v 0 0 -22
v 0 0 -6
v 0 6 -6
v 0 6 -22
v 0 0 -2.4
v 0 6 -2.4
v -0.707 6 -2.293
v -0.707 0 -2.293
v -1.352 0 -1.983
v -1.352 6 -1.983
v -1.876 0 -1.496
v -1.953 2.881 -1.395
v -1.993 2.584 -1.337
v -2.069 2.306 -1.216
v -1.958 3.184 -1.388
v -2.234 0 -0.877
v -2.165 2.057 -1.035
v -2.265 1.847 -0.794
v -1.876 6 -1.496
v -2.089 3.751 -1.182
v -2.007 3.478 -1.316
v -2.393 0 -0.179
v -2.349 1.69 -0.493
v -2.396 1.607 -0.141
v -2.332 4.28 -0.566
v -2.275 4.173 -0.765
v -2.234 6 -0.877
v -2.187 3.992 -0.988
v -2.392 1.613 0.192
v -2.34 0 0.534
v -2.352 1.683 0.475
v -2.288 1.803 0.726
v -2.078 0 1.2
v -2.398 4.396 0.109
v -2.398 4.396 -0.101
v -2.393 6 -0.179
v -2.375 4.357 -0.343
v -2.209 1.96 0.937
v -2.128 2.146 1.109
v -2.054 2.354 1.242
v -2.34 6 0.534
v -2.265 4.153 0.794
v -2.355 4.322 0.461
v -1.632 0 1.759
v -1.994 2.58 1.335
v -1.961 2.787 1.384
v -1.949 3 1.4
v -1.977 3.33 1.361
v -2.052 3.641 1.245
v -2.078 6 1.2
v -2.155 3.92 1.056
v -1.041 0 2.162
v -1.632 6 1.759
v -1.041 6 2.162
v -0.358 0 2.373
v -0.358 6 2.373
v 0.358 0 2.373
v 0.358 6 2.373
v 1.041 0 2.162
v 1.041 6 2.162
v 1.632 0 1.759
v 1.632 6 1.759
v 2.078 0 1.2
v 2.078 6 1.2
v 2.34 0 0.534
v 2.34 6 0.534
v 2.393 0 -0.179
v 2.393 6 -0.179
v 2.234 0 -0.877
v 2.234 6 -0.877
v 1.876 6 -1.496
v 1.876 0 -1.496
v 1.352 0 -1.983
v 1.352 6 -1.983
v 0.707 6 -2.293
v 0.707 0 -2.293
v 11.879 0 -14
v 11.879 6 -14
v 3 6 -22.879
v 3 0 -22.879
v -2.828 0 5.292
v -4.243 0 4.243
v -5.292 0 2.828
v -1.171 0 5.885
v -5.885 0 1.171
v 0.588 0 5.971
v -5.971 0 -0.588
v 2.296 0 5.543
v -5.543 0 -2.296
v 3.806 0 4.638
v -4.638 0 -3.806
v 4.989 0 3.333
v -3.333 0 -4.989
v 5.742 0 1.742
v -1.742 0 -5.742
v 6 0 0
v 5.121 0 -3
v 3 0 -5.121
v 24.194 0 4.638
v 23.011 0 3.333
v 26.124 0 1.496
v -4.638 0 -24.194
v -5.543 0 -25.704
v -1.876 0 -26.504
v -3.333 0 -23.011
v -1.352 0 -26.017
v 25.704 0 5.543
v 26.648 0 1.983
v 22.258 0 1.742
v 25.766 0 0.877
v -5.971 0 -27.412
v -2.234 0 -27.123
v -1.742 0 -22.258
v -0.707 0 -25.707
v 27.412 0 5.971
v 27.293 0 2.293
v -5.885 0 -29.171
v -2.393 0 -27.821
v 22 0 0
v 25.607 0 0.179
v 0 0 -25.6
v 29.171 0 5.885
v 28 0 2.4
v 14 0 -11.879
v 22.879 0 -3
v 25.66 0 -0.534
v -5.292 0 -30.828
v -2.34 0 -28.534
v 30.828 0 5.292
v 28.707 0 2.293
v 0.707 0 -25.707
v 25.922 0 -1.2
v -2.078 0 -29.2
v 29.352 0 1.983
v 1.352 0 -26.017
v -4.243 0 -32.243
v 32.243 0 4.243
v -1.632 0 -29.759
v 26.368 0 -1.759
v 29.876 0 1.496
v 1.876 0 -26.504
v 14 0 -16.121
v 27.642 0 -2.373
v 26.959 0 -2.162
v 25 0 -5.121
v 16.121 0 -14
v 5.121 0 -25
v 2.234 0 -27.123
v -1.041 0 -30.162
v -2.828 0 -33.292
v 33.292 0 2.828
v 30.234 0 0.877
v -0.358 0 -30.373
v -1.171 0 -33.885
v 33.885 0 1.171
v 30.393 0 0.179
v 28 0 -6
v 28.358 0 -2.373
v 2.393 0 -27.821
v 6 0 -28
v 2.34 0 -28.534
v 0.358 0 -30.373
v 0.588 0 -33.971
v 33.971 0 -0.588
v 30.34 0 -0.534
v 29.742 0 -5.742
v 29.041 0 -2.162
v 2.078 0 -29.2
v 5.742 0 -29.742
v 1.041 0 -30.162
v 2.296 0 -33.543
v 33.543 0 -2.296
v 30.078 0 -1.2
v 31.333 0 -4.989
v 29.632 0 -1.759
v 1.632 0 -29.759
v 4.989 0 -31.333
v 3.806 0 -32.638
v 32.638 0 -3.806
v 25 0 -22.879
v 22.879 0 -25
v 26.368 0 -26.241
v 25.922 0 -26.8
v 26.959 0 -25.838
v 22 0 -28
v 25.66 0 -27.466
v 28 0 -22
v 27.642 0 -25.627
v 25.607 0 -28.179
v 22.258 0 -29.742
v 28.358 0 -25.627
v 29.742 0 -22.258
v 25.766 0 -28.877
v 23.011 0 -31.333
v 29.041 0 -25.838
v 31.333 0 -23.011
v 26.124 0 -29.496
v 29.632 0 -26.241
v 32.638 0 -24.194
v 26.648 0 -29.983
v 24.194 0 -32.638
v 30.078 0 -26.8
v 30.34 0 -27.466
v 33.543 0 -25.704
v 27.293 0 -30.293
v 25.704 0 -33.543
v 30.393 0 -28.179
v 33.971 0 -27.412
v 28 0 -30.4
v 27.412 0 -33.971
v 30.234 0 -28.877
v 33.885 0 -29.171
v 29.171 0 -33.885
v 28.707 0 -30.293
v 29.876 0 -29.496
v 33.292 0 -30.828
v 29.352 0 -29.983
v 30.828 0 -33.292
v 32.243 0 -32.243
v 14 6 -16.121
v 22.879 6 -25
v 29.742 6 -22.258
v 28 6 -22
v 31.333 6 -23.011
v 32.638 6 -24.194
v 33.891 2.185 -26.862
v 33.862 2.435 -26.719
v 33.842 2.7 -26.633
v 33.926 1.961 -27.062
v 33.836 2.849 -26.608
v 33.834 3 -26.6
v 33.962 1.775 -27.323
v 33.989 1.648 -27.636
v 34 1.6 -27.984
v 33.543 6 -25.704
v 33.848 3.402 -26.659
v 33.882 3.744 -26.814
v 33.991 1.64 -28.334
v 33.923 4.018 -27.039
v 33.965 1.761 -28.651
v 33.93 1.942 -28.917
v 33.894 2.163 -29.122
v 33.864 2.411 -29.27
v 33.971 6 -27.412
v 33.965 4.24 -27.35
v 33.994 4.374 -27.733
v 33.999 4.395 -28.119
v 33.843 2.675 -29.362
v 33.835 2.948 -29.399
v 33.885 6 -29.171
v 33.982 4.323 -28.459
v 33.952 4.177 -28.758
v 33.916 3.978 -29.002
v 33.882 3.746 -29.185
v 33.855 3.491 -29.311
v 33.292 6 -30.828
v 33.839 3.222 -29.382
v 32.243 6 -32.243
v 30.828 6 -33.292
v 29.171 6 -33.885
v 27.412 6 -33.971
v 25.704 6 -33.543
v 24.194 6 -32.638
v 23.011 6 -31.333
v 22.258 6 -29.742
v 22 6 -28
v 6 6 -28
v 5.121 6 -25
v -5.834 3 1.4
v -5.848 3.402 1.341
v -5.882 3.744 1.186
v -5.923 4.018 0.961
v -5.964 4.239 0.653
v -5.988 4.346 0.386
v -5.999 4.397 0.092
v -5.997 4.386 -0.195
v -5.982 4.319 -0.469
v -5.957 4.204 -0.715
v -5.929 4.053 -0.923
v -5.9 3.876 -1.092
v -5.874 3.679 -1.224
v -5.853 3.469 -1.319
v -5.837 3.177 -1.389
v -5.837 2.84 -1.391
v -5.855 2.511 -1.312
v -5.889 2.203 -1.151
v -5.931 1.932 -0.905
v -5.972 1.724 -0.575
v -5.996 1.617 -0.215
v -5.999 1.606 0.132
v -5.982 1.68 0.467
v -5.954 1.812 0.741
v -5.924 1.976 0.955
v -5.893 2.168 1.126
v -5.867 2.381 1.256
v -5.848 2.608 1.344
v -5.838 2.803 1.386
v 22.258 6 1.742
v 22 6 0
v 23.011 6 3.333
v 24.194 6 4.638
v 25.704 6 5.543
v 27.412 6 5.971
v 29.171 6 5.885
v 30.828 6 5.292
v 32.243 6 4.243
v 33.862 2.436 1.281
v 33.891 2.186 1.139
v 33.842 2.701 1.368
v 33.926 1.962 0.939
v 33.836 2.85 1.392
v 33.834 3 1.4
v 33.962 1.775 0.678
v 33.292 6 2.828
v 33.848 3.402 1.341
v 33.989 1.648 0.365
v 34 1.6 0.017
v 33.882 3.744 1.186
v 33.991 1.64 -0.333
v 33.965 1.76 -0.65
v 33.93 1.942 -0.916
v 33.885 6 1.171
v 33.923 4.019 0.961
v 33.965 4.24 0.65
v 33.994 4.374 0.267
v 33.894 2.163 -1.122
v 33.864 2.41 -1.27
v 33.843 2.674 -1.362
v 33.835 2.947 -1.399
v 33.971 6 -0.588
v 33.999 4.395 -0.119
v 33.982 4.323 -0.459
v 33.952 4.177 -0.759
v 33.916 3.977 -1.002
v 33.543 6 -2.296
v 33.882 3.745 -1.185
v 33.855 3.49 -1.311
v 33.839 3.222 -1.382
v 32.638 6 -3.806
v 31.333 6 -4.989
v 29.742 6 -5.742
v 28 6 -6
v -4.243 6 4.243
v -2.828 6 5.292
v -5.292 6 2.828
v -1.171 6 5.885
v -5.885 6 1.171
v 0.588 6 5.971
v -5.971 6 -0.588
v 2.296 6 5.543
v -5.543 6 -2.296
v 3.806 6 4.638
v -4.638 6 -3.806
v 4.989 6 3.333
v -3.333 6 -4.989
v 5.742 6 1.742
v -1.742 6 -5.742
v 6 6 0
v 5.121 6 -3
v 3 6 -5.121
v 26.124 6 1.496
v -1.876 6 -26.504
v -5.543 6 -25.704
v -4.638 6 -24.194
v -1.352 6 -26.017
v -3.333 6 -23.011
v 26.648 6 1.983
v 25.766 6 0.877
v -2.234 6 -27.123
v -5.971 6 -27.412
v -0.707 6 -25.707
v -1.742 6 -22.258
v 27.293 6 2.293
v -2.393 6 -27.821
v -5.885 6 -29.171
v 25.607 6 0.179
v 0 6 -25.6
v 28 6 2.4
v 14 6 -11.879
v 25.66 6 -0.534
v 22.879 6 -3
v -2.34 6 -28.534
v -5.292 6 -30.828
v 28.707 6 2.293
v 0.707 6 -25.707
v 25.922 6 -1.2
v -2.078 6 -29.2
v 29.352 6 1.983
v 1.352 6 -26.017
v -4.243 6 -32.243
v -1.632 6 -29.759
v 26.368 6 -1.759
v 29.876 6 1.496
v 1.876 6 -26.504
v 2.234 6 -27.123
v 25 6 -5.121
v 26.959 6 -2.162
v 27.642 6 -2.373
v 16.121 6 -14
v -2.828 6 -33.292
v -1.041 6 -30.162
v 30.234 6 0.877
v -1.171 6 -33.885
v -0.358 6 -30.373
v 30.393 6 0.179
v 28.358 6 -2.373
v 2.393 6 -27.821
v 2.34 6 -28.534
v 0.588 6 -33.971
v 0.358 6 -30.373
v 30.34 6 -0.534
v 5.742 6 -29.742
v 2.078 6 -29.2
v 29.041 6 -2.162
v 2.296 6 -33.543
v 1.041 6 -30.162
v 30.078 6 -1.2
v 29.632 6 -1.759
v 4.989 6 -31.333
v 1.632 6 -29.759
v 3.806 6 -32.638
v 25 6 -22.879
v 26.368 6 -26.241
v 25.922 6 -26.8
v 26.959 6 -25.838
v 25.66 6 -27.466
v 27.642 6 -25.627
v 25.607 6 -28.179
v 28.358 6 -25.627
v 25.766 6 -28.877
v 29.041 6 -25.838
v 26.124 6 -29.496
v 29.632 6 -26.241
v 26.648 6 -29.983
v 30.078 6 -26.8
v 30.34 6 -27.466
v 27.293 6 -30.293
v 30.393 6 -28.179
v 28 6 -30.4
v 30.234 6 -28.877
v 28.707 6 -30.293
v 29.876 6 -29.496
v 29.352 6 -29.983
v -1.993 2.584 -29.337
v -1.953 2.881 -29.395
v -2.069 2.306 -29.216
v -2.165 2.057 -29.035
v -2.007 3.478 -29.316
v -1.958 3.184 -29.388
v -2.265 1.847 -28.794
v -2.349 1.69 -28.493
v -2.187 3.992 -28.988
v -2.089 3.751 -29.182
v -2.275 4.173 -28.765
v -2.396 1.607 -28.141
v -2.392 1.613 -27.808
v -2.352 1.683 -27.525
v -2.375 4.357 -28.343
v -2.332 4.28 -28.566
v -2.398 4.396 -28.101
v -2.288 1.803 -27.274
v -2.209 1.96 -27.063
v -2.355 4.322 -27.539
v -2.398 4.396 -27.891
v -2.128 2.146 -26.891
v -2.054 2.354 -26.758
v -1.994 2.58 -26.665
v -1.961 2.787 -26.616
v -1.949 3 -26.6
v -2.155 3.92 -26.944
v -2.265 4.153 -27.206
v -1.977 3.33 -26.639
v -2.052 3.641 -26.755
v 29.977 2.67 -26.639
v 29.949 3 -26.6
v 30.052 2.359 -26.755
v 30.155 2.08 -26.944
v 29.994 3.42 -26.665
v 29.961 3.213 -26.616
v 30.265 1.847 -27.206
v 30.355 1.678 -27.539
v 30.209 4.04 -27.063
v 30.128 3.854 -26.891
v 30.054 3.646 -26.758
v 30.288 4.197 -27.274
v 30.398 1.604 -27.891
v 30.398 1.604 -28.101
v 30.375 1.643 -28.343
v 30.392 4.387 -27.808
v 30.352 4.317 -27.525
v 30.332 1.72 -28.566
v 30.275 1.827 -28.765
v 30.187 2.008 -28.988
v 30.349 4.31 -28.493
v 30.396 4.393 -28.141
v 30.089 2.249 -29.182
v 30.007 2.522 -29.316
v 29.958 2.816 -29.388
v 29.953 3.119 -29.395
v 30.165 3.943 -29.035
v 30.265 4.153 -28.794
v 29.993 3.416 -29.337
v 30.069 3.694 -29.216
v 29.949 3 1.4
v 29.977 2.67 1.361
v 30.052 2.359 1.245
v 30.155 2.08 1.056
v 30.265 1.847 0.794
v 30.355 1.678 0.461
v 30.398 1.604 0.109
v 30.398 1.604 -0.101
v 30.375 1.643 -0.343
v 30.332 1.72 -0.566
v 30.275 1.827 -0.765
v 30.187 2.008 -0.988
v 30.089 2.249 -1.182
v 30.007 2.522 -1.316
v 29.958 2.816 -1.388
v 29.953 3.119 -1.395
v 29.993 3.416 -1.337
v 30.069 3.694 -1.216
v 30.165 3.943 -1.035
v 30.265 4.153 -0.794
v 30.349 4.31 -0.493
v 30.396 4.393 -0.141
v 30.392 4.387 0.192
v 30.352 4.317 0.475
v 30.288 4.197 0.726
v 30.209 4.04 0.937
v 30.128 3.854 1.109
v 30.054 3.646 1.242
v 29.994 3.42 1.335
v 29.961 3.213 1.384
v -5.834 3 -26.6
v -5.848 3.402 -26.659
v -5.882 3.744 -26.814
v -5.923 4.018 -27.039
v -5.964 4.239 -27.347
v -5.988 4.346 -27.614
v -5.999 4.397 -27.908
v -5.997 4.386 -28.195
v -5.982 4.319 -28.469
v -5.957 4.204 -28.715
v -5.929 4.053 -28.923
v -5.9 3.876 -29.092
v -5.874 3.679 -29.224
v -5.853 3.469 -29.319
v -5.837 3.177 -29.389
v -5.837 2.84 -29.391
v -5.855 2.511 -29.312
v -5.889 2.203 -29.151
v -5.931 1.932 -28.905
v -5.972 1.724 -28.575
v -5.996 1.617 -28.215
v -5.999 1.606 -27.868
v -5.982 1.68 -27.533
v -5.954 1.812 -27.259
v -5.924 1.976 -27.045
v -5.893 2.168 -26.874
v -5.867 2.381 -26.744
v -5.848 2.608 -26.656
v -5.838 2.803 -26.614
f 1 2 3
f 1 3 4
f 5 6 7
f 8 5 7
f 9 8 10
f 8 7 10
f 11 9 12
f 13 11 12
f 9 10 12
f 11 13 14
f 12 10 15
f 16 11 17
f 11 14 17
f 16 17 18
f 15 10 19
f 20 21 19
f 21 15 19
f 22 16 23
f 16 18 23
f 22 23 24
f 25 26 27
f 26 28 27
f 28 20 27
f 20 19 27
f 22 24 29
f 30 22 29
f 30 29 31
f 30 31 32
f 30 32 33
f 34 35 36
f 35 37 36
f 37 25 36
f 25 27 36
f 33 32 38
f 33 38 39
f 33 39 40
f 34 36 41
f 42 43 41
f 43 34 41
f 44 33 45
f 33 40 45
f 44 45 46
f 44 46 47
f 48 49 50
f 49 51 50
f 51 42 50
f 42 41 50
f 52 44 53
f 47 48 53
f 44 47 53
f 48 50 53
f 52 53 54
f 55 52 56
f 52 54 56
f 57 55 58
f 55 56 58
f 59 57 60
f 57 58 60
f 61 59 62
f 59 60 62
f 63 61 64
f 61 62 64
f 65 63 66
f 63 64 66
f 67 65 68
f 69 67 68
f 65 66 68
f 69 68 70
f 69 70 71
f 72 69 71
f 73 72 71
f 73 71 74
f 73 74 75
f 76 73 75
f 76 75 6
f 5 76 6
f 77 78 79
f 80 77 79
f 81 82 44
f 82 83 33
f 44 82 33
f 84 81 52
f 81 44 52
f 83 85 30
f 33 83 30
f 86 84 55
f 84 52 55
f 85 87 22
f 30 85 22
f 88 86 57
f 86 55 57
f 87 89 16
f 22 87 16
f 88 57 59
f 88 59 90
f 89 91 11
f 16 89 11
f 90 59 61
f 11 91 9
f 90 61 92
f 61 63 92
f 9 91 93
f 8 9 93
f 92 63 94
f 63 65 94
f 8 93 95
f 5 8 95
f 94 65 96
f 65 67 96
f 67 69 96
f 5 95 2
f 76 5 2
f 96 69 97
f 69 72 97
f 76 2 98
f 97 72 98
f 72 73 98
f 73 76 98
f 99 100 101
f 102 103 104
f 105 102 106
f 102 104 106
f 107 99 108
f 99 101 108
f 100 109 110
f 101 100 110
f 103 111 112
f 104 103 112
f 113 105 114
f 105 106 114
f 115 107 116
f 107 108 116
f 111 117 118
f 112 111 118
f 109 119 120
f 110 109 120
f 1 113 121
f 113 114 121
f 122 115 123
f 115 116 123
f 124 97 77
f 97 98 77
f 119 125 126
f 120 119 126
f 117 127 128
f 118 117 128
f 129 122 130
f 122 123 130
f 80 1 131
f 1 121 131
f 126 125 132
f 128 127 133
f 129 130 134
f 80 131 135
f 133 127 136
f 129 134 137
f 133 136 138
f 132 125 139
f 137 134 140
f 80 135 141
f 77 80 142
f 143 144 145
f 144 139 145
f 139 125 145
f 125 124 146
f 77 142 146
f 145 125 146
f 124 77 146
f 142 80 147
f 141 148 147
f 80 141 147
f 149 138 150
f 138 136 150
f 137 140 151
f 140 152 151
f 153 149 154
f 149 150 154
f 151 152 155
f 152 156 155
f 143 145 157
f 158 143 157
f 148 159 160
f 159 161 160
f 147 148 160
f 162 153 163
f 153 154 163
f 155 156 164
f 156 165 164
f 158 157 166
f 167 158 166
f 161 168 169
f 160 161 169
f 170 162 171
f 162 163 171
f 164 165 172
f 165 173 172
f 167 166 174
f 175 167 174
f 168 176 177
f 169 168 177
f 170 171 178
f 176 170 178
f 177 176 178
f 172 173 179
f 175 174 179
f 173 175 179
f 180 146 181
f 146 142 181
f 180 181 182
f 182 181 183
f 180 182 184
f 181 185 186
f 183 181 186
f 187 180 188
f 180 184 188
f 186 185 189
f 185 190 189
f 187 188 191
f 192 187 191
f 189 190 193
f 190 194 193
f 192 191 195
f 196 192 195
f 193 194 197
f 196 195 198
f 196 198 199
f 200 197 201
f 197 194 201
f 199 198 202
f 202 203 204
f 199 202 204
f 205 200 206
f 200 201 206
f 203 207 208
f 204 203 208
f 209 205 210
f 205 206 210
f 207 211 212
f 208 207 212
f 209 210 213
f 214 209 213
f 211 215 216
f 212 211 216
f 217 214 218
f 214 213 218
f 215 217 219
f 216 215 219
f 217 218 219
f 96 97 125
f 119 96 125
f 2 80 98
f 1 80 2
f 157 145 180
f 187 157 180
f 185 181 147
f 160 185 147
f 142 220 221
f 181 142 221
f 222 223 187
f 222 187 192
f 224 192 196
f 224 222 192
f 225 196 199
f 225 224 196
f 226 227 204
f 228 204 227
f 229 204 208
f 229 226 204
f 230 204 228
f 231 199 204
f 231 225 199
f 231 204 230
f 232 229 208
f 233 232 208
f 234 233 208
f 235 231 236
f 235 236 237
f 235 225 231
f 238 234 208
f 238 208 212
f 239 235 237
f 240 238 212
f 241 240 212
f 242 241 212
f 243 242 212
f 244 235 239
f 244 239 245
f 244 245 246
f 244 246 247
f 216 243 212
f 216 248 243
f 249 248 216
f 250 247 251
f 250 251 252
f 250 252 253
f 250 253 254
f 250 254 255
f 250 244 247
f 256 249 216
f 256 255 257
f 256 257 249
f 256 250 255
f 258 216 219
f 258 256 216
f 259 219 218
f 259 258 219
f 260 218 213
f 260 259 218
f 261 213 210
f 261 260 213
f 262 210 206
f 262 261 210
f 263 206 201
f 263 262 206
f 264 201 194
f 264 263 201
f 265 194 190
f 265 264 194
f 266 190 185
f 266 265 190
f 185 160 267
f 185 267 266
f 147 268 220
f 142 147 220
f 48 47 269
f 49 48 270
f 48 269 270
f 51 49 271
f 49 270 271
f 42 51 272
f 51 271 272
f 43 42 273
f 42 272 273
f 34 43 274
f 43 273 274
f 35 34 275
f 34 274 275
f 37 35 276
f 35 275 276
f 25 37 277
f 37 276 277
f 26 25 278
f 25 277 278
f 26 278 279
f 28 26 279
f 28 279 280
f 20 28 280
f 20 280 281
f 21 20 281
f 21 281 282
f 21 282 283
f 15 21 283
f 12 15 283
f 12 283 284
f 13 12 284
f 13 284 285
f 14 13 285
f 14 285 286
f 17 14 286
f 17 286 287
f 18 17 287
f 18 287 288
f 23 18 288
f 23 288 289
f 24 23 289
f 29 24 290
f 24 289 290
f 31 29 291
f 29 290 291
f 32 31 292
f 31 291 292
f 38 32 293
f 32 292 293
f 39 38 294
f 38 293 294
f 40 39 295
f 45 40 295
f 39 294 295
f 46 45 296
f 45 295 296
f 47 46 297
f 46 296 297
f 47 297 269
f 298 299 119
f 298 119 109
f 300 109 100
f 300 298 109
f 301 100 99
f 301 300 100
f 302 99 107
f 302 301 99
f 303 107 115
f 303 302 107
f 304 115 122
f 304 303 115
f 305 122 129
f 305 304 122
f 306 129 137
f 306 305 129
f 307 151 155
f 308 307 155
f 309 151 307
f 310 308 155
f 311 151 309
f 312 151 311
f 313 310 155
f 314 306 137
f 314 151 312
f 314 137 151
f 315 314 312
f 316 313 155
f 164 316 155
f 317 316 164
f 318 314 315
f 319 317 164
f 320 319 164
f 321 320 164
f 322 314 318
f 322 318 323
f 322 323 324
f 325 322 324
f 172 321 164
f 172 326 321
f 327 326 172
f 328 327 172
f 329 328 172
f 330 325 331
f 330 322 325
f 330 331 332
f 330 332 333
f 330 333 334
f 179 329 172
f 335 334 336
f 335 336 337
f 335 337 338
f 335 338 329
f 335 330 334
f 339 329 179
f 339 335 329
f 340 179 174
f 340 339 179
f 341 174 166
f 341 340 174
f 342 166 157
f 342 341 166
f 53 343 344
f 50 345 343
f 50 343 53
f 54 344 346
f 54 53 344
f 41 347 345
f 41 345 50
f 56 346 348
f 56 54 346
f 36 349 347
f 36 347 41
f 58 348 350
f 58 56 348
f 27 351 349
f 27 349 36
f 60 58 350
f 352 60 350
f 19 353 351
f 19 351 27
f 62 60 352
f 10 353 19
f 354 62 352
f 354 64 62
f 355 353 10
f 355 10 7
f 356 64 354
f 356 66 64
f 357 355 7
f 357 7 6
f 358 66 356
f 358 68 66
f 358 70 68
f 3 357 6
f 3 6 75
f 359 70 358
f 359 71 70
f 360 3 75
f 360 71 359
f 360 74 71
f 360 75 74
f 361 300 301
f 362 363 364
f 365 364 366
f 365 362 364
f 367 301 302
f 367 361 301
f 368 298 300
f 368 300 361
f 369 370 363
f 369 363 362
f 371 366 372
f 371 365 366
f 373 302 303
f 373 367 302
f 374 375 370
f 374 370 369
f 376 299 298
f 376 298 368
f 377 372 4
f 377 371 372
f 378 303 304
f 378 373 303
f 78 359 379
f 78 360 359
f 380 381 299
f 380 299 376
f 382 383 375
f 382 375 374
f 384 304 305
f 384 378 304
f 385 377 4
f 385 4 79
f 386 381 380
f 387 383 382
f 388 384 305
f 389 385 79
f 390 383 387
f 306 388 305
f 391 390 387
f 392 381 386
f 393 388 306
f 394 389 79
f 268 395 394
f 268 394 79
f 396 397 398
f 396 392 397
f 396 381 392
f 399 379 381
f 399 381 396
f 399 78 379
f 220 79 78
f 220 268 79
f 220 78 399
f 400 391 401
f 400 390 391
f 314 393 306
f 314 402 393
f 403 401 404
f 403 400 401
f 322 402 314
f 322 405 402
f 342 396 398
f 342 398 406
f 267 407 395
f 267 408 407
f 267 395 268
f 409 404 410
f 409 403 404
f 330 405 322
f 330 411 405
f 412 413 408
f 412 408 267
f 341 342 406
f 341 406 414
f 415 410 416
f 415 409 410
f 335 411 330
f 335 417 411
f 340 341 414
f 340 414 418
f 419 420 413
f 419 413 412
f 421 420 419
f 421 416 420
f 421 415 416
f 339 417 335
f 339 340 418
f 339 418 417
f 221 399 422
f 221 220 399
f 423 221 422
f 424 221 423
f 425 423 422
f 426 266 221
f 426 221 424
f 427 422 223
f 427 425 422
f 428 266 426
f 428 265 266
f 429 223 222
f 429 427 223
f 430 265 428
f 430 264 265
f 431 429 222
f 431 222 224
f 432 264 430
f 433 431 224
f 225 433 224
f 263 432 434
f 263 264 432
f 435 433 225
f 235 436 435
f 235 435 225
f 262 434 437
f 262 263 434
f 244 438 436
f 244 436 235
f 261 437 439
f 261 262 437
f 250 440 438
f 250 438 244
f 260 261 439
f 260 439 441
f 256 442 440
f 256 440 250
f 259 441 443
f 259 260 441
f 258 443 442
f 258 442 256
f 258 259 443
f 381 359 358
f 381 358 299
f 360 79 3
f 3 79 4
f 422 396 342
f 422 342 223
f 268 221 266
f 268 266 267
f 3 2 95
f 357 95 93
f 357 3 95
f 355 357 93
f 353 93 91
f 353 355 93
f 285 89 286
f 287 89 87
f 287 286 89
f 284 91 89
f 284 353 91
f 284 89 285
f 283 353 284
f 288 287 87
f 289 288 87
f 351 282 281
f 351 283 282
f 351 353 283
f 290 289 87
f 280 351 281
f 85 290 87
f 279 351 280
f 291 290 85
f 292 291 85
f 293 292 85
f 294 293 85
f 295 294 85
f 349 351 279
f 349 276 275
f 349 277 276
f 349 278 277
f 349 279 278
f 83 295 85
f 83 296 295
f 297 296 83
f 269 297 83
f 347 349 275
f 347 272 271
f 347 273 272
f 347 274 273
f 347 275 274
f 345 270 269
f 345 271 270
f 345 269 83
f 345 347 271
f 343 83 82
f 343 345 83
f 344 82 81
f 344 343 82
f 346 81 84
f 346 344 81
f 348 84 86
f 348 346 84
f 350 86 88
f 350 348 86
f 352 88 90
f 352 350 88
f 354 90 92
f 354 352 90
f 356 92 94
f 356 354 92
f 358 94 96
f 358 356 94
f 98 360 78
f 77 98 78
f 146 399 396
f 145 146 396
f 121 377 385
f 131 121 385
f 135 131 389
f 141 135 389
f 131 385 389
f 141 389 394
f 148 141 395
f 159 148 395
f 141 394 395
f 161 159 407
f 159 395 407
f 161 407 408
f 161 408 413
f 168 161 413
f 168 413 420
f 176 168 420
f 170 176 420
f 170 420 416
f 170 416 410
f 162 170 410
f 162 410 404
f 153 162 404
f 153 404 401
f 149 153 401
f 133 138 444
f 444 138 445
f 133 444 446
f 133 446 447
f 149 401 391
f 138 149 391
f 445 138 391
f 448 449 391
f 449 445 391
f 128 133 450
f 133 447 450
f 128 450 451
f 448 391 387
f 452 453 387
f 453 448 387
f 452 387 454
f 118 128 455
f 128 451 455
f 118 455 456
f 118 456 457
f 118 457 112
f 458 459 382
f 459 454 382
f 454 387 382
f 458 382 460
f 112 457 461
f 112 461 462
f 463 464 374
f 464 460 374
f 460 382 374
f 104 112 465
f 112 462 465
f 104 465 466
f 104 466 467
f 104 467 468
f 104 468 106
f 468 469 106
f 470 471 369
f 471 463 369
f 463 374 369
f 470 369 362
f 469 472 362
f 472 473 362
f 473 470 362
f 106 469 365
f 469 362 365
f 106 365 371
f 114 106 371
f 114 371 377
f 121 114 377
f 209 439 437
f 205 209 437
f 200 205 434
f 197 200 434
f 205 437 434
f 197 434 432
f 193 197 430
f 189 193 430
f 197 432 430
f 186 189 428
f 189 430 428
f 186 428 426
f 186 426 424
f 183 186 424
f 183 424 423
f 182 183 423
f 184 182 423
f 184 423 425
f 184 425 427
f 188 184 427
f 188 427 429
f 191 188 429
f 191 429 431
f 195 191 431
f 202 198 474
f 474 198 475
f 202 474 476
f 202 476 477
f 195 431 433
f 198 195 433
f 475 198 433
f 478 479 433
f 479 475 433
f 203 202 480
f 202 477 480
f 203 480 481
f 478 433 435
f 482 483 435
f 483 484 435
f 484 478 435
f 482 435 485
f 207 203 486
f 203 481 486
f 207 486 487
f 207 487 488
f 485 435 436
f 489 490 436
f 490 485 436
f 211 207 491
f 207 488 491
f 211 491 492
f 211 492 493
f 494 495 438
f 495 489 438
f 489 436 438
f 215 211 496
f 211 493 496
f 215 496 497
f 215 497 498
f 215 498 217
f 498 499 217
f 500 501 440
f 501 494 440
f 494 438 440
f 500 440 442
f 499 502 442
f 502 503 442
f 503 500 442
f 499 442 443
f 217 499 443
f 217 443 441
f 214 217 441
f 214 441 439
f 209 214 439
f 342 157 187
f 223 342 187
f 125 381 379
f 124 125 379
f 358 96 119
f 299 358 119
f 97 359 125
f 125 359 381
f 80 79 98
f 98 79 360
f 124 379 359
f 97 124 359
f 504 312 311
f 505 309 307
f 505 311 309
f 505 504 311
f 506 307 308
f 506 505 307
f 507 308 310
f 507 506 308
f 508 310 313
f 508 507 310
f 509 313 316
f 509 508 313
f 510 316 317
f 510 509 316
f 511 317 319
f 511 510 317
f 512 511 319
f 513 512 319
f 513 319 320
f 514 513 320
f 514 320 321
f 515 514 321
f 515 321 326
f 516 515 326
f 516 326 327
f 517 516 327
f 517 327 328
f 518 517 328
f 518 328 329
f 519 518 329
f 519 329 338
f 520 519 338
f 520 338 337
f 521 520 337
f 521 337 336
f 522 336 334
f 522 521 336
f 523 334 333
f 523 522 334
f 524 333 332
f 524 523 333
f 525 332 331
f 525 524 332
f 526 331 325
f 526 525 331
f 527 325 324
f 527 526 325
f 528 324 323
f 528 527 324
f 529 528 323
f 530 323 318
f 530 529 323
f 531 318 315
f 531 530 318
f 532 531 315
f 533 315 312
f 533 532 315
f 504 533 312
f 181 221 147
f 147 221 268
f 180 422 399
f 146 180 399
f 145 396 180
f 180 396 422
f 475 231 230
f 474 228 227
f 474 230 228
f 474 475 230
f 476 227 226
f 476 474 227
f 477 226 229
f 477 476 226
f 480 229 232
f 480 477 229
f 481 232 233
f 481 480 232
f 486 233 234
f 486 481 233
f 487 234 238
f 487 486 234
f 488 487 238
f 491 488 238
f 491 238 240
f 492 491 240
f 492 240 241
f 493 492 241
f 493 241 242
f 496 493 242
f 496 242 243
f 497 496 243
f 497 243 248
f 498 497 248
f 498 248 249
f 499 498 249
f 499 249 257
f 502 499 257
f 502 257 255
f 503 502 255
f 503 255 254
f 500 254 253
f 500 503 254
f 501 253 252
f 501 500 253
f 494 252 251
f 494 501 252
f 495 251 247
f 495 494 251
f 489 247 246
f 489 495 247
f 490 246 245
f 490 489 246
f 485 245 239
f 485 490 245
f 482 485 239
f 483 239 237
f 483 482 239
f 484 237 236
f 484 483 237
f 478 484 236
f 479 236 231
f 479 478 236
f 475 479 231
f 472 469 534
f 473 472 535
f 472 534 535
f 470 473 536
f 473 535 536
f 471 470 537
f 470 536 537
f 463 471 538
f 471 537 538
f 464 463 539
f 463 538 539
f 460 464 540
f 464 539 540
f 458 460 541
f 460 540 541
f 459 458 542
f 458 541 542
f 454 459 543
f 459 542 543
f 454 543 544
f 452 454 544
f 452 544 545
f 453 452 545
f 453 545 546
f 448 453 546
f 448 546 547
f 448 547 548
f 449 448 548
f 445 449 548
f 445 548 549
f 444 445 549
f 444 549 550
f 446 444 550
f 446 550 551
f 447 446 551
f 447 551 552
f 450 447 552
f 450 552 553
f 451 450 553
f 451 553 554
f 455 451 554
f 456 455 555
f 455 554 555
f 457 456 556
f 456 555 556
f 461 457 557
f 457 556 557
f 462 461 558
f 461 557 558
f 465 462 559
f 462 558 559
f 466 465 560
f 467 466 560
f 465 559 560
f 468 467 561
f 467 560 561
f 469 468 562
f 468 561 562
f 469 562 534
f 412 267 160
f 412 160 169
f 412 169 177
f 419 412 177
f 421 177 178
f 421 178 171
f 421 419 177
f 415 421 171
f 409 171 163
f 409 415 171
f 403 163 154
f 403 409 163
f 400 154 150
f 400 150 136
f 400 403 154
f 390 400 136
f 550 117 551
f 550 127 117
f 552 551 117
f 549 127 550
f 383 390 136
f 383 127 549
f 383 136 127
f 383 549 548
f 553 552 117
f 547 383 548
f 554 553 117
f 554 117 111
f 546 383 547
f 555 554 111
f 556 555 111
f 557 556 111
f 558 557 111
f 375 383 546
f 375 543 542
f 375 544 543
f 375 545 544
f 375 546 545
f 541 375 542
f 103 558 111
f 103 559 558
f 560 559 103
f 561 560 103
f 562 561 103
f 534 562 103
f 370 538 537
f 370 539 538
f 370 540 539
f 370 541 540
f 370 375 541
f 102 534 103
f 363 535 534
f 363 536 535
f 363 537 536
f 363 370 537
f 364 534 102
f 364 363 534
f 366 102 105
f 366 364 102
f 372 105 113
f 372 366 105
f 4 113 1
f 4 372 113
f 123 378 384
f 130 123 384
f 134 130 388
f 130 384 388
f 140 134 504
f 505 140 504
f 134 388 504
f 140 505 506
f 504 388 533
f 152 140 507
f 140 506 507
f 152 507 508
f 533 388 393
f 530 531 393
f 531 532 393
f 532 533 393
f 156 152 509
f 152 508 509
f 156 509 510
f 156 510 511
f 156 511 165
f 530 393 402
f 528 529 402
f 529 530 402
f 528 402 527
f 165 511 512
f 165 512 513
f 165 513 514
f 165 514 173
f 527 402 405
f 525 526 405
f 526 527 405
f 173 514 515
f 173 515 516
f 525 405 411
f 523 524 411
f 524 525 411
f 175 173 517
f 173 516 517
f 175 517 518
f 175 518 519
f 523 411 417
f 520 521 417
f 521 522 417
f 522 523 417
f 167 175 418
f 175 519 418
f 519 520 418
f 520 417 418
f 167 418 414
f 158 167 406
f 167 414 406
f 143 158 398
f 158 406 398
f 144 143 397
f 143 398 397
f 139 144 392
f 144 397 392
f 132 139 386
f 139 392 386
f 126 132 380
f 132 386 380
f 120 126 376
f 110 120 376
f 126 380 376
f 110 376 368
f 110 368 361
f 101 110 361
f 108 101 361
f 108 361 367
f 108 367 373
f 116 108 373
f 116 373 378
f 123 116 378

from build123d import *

# Parameters (mm, degrees)
SKETCH1_W           = 28
SKETCH1_H           = 28
BOSS_EXTRUDE1_DEPTH = 6
SKETCH2_R           = 6
BOSS_EXTRUDE2_DEPTH = 6
SKETCH3_R           = 2.4
CUT_EXTRUDE1_DEPTH  = 49.456165758
CUT_EXTRUDE2_DEPTH  = 10
SKETCH5_R           = 1.4
CUT_EXTRUDE3_DEPTH  = 10
CUT_EXTRUDE4_START  = 10
SKETCH6_R           = 1.4
CUT_EXTRUDE4_DEPTH  = 10


with BuildPart() as part:
    # Sketch1 → Boss-Extrude1 (new body)
    with BuildSketch(Plane(origin=(0, 0, 0), x_dir=(1, 0, 0), z_dir=(0, 1, 0))):
        with Locations((14, 14)):
            Rectangle(SKETCH1_W, SKETCH1_H)
    extrude(amount=BOSS_EXTRUDE1_DEPTH)

    # Sketch2 → Boss-Extrude2 (add)
    with BuildSketch(Plane(origin=(0, 6, 0), x_dir=(1, 0, 0), z_dir=(0, 1, 0))):
        with Locations((0, 28)):
            Circle(SKETCH2_R)
        with Locations((28, 28)):
            Circle(SKETCH2_R)
        with Locations((28, 0)):
            Circle(SKETCH2_R)
        Circle(SKETCH2_R)
    extrude(amount=-BOSS_EXTRUDE2_DEPTH)

    # Sketch3 → Cut-Extrude1 (cut, through all)
    with BuildSketch(Plane(origin=(0, 6, 0), x_dir=(1, 0, 0), z_dir=(0, 1, 0))):
        with Locations(Location((0, 28, 0), (0, 0, 270))):
            Circle(SKETCH3_R)
        with Locations(Location((28, 28, 0), (0, 0, 90))):
            Circle(SKETCH3_R)
        with Locations(Location((28, 0, 0), (0, 0, 270))):
            Circle(SKETCH3_R)
        with Locations(Location((0, 0, 0), (0, 0, 90))):
            Circle(SKETCH3_R)
    extrude(amount=-CUT_EXTRUDE1_DEPTH, mode=Mode.SUBTRACT)

    # Sketch4 → Cut-Extrude2 (cut)
    with BuildSketch(Plane(origin=(0, 6, 0), x_dir=(1, 0, 0), z_dir=(0, 1, 0))):
        Polygon((11.878679656, 14), (3, 22.878679656), (3, 5.121320344), align=None)
        Polygon((22.878679656, 25), (5.121320344, 25), (14, 16.121320344), align=None)
        Polygon((25, 5.121320344), (25, 22.878679656), (16.121320344, 14), align=None)
        Polygon((14, 11.878679656), (5.121320344, 3), (22.878679656, 3), align=None)
    extrude(amount=-CUT_EXTRUDE2_DEPTH, mode=Mode.SUBTRACT)

    # Sketch5 → Cut-Extrude3 (cut)
    with BuildSketch(Plane(origin=(28, 0, 0), x_dir=(0, 0, -1), z_dir=(1, 0, 0))):
        with Locations(Location((0, 3, 0), (0, 0, 180))):
            Circle(SKETCH5_R)
        with Locations(Location((28, 3, 0), (0, 0, 180))):
            Circle(SKETCH5_R)
    extrude(amount=CUT_EXTRUDE3_DEPTH, mode=Mode.SUBTRACT)

    # Sketch6 → Cut-Extrude4 (cut)
    with BuildSketch(Plane.ZY.offset(CUT_EXTRUDE4_START)):
        with Locations((-28, 3)):
            Circle(SKETCH6_R)
        with Locations((0, 3)):
            Circle(SKETCH6_R)
    extrude(amount=-CUT_EXTRUDE4_DEPTH, mode=Mode.SUBTRACT)


solid = part.part
